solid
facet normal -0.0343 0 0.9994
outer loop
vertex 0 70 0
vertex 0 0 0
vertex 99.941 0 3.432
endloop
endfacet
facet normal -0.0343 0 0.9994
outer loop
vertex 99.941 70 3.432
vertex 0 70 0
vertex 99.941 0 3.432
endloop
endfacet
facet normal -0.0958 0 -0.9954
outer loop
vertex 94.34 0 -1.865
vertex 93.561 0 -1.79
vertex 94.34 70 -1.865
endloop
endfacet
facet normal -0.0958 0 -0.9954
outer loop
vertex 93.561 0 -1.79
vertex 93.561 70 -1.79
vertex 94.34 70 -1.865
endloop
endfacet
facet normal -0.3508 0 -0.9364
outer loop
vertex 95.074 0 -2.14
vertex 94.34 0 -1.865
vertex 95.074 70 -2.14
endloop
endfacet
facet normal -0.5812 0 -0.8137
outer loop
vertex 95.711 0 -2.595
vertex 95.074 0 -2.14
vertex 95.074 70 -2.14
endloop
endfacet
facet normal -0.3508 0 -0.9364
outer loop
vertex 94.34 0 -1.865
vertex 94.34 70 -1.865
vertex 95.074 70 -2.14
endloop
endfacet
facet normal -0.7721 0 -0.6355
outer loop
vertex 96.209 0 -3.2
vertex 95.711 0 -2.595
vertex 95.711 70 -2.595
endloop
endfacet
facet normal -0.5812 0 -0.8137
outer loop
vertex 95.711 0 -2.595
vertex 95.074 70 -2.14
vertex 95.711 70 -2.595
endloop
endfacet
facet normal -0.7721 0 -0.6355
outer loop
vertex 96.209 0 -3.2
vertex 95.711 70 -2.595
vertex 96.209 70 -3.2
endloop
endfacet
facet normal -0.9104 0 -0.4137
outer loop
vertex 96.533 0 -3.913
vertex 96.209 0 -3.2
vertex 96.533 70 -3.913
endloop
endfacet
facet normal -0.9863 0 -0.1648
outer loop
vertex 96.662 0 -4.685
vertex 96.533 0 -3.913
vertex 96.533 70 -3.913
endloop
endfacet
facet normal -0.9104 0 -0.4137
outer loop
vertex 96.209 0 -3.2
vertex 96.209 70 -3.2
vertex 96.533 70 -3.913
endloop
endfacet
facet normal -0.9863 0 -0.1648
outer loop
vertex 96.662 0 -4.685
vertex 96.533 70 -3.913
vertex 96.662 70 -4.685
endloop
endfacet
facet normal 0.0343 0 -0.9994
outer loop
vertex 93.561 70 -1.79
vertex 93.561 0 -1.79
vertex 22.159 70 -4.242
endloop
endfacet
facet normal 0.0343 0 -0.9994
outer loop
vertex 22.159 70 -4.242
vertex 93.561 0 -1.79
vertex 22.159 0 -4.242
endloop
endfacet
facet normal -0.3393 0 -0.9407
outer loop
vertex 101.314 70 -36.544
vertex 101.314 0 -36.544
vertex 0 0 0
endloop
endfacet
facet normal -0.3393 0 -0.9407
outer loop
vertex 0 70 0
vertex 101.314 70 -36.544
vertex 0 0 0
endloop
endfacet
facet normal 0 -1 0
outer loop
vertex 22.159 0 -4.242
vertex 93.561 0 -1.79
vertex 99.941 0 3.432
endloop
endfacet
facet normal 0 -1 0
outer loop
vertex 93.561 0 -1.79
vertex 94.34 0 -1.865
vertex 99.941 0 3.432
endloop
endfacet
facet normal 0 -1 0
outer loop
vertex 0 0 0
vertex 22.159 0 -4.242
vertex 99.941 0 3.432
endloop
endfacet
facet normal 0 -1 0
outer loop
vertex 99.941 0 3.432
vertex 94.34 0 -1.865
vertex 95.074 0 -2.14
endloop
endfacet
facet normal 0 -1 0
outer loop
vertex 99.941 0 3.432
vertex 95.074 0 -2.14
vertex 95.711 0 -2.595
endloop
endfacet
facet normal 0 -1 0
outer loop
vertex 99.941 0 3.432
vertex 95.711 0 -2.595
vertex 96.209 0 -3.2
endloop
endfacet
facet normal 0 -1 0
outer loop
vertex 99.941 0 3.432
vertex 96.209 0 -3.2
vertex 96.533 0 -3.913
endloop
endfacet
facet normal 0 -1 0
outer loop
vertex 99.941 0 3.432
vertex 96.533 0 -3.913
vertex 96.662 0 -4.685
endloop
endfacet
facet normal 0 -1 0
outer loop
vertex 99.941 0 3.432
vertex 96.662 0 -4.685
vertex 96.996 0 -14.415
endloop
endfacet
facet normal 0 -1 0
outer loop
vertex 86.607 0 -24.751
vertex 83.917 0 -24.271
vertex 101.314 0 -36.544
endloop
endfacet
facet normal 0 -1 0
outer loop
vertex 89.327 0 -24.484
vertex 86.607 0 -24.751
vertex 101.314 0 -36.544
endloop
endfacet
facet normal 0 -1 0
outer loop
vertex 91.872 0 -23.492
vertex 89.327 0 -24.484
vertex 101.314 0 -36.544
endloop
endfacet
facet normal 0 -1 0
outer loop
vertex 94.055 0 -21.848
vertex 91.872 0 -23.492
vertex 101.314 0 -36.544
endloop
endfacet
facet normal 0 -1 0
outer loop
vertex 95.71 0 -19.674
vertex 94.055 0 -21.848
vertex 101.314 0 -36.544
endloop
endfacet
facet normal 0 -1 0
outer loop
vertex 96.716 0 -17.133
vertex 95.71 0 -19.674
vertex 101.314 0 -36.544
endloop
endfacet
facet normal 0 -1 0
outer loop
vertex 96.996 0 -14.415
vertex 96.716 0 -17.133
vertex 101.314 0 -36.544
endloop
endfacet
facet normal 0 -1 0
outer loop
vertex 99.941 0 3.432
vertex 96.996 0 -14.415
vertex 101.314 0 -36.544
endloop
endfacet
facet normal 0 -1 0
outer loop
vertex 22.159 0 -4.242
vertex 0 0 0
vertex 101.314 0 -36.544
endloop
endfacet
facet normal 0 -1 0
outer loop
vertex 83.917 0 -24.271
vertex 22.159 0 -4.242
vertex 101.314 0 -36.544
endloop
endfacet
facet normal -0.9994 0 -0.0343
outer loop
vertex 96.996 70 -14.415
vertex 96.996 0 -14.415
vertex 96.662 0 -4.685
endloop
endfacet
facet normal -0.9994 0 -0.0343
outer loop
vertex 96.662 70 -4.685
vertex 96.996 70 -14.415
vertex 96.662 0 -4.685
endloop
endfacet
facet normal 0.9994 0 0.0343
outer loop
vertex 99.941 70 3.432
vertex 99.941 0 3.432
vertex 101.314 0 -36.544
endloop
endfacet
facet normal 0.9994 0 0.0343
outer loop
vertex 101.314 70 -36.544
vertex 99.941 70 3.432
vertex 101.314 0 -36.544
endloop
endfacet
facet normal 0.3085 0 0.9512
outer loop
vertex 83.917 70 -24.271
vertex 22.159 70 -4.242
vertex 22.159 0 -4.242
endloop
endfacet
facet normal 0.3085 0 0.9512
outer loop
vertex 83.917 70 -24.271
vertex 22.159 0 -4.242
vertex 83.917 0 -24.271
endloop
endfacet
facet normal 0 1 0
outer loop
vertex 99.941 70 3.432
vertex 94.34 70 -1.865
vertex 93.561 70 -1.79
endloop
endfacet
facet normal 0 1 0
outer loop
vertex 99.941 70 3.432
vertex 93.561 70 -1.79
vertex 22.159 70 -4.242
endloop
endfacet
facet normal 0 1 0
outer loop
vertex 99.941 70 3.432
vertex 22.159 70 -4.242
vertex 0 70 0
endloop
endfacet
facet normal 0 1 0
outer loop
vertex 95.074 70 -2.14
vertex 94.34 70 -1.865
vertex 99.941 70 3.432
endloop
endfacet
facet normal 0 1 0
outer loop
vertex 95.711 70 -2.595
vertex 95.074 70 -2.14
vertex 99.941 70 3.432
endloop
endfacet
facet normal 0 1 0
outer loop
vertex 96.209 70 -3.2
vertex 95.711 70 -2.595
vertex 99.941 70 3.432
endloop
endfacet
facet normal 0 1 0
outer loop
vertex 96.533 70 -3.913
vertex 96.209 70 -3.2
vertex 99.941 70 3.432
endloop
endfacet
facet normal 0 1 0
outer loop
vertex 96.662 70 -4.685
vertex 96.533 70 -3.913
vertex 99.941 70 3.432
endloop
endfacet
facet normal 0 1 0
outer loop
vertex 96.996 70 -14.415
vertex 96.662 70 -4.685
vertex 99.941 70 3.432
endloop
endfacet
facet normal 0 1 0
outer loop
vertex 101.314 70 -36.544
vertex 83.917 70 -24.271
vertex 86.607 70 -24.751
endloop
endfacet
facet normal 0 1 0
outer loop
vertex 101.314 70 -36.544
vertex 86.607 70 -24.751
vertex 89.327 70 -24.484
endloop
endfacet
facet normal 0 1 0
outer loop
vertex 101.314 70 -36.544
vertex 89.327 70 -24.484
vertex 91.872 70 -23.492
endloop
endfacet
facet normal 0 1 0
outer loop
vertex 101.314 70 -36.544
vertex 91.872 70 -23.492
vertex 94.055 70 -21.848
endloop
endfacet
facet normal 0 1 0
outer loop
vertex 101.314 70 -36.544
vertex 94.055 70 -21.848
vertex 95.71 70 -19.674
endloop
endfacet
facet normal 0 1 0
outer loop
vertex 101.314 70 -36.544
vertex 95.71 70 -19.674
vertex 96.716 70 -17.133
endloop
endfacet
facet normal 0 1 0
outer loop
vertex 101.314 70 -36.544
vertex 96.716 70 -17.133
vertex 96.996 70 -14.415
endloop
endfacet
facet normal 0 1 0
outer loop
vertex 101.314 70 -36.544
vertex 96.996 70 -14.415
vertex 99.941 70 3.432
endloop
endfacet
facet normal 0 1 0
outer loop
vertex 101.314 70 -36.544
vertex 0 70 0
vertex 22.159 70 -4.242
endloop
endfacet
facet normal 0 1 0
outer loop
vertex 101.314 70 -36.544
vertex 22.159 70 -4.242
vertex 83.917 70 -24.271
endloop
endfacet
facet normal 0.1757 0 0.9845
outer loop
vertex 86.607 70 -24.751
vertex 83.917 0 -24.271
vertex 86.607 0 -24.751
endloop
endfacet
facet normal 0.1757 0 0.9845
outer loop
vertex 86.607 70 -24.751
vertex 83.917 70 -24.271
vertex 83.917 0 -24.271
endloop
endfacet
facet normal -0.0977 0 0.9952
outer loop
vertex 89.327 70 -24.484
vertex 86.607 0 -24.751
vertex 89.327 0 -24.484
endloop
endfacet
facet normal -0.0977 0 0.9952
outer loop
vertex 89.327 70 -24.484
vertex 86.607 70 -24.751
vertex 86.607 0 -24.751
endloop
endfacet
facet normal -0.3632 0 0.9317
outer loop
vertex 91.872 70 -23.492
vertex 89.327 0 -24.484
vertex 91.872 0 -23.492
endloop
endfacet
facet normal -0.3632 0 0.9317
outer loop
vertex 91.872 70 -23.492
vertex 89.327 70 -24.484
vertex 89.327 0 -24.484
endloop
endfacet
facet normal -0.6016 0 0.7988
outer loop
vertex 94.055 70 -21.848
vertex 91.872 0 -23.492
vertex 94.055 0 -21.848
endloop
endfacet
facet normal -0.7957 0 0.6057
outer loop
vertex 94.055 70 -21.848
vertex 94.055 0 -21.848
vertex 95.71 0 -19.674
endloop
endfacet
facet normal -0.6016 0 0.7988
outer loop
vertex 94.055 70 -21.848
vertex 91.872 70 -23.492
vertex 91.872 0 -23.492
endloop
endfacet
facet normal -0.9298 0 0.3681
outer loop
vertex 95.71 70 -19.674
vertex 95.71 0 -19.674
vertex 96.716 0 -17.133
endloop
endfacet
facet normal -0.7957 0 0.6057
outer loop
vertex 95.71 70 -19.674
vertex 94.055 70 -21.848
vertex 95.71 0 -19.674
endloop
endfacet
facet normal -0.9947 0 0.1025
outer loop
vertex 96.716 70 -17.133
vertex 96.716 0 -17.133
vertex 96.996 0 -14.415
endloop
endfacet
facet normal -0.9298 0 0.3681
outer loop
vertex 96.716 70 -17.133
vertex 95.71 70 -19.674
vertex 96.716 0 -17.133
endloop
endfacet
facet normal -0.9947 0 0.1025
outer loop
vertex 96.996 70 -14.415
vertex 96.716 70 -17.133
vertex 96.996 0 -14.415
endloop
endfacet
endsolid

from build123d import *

# Parameters (mm, degrees)
EXTRUDE_2_DEPTH     = 70
CUT_EXTRUDE_1_DEPTH = 129.452325787
FILLET_1_R          = 10
FILLET_2_R          = 3


with BuildPart() as part:
    # 草图5 → 凸台-拉伸2 (new body)
    with BuildSketch(Plane(origin=(0, 0, 0), x_dir=(1, 0, 0), z_dir=(0, 1, 0))):
        Polygon((0, 0), (99.941085936, -3.432104596), (101.313927774, 36.544329779), align=None)
    extrude(amount=EXTRUDE_2_DEPTH)

    # 草图8 → 切除-拉伸1 (cut, through all)
    with BuildSketch(Plane.XZ):
        Polygon((97.48567579, -28.67108094), (96.55900755, -1.686987737), (22.158644136, -4.241991286), align=None)
    extrude(amount=-CUT_EXTRUDE_1_DEPTH, mode=Mode.SUBTRACT)

    # 圆角1
    fillet_1_edges = [part.edges().sort_by_distance(p)[0] for p in [
        (97.48567579, 35, -28.67108094),
    ]]
    fillet(fillet_1_edges, radius=FILLET_1_R)

    # 圆角2
    fillet_2_edges = [part.edges().sort_by_distance(p)[0] for p in [
        (96.55900755, 35, -1.686987737),
    ]]
    fillet(fillet_2_edges, radius=FILLET_2_R)


solid = part.part
